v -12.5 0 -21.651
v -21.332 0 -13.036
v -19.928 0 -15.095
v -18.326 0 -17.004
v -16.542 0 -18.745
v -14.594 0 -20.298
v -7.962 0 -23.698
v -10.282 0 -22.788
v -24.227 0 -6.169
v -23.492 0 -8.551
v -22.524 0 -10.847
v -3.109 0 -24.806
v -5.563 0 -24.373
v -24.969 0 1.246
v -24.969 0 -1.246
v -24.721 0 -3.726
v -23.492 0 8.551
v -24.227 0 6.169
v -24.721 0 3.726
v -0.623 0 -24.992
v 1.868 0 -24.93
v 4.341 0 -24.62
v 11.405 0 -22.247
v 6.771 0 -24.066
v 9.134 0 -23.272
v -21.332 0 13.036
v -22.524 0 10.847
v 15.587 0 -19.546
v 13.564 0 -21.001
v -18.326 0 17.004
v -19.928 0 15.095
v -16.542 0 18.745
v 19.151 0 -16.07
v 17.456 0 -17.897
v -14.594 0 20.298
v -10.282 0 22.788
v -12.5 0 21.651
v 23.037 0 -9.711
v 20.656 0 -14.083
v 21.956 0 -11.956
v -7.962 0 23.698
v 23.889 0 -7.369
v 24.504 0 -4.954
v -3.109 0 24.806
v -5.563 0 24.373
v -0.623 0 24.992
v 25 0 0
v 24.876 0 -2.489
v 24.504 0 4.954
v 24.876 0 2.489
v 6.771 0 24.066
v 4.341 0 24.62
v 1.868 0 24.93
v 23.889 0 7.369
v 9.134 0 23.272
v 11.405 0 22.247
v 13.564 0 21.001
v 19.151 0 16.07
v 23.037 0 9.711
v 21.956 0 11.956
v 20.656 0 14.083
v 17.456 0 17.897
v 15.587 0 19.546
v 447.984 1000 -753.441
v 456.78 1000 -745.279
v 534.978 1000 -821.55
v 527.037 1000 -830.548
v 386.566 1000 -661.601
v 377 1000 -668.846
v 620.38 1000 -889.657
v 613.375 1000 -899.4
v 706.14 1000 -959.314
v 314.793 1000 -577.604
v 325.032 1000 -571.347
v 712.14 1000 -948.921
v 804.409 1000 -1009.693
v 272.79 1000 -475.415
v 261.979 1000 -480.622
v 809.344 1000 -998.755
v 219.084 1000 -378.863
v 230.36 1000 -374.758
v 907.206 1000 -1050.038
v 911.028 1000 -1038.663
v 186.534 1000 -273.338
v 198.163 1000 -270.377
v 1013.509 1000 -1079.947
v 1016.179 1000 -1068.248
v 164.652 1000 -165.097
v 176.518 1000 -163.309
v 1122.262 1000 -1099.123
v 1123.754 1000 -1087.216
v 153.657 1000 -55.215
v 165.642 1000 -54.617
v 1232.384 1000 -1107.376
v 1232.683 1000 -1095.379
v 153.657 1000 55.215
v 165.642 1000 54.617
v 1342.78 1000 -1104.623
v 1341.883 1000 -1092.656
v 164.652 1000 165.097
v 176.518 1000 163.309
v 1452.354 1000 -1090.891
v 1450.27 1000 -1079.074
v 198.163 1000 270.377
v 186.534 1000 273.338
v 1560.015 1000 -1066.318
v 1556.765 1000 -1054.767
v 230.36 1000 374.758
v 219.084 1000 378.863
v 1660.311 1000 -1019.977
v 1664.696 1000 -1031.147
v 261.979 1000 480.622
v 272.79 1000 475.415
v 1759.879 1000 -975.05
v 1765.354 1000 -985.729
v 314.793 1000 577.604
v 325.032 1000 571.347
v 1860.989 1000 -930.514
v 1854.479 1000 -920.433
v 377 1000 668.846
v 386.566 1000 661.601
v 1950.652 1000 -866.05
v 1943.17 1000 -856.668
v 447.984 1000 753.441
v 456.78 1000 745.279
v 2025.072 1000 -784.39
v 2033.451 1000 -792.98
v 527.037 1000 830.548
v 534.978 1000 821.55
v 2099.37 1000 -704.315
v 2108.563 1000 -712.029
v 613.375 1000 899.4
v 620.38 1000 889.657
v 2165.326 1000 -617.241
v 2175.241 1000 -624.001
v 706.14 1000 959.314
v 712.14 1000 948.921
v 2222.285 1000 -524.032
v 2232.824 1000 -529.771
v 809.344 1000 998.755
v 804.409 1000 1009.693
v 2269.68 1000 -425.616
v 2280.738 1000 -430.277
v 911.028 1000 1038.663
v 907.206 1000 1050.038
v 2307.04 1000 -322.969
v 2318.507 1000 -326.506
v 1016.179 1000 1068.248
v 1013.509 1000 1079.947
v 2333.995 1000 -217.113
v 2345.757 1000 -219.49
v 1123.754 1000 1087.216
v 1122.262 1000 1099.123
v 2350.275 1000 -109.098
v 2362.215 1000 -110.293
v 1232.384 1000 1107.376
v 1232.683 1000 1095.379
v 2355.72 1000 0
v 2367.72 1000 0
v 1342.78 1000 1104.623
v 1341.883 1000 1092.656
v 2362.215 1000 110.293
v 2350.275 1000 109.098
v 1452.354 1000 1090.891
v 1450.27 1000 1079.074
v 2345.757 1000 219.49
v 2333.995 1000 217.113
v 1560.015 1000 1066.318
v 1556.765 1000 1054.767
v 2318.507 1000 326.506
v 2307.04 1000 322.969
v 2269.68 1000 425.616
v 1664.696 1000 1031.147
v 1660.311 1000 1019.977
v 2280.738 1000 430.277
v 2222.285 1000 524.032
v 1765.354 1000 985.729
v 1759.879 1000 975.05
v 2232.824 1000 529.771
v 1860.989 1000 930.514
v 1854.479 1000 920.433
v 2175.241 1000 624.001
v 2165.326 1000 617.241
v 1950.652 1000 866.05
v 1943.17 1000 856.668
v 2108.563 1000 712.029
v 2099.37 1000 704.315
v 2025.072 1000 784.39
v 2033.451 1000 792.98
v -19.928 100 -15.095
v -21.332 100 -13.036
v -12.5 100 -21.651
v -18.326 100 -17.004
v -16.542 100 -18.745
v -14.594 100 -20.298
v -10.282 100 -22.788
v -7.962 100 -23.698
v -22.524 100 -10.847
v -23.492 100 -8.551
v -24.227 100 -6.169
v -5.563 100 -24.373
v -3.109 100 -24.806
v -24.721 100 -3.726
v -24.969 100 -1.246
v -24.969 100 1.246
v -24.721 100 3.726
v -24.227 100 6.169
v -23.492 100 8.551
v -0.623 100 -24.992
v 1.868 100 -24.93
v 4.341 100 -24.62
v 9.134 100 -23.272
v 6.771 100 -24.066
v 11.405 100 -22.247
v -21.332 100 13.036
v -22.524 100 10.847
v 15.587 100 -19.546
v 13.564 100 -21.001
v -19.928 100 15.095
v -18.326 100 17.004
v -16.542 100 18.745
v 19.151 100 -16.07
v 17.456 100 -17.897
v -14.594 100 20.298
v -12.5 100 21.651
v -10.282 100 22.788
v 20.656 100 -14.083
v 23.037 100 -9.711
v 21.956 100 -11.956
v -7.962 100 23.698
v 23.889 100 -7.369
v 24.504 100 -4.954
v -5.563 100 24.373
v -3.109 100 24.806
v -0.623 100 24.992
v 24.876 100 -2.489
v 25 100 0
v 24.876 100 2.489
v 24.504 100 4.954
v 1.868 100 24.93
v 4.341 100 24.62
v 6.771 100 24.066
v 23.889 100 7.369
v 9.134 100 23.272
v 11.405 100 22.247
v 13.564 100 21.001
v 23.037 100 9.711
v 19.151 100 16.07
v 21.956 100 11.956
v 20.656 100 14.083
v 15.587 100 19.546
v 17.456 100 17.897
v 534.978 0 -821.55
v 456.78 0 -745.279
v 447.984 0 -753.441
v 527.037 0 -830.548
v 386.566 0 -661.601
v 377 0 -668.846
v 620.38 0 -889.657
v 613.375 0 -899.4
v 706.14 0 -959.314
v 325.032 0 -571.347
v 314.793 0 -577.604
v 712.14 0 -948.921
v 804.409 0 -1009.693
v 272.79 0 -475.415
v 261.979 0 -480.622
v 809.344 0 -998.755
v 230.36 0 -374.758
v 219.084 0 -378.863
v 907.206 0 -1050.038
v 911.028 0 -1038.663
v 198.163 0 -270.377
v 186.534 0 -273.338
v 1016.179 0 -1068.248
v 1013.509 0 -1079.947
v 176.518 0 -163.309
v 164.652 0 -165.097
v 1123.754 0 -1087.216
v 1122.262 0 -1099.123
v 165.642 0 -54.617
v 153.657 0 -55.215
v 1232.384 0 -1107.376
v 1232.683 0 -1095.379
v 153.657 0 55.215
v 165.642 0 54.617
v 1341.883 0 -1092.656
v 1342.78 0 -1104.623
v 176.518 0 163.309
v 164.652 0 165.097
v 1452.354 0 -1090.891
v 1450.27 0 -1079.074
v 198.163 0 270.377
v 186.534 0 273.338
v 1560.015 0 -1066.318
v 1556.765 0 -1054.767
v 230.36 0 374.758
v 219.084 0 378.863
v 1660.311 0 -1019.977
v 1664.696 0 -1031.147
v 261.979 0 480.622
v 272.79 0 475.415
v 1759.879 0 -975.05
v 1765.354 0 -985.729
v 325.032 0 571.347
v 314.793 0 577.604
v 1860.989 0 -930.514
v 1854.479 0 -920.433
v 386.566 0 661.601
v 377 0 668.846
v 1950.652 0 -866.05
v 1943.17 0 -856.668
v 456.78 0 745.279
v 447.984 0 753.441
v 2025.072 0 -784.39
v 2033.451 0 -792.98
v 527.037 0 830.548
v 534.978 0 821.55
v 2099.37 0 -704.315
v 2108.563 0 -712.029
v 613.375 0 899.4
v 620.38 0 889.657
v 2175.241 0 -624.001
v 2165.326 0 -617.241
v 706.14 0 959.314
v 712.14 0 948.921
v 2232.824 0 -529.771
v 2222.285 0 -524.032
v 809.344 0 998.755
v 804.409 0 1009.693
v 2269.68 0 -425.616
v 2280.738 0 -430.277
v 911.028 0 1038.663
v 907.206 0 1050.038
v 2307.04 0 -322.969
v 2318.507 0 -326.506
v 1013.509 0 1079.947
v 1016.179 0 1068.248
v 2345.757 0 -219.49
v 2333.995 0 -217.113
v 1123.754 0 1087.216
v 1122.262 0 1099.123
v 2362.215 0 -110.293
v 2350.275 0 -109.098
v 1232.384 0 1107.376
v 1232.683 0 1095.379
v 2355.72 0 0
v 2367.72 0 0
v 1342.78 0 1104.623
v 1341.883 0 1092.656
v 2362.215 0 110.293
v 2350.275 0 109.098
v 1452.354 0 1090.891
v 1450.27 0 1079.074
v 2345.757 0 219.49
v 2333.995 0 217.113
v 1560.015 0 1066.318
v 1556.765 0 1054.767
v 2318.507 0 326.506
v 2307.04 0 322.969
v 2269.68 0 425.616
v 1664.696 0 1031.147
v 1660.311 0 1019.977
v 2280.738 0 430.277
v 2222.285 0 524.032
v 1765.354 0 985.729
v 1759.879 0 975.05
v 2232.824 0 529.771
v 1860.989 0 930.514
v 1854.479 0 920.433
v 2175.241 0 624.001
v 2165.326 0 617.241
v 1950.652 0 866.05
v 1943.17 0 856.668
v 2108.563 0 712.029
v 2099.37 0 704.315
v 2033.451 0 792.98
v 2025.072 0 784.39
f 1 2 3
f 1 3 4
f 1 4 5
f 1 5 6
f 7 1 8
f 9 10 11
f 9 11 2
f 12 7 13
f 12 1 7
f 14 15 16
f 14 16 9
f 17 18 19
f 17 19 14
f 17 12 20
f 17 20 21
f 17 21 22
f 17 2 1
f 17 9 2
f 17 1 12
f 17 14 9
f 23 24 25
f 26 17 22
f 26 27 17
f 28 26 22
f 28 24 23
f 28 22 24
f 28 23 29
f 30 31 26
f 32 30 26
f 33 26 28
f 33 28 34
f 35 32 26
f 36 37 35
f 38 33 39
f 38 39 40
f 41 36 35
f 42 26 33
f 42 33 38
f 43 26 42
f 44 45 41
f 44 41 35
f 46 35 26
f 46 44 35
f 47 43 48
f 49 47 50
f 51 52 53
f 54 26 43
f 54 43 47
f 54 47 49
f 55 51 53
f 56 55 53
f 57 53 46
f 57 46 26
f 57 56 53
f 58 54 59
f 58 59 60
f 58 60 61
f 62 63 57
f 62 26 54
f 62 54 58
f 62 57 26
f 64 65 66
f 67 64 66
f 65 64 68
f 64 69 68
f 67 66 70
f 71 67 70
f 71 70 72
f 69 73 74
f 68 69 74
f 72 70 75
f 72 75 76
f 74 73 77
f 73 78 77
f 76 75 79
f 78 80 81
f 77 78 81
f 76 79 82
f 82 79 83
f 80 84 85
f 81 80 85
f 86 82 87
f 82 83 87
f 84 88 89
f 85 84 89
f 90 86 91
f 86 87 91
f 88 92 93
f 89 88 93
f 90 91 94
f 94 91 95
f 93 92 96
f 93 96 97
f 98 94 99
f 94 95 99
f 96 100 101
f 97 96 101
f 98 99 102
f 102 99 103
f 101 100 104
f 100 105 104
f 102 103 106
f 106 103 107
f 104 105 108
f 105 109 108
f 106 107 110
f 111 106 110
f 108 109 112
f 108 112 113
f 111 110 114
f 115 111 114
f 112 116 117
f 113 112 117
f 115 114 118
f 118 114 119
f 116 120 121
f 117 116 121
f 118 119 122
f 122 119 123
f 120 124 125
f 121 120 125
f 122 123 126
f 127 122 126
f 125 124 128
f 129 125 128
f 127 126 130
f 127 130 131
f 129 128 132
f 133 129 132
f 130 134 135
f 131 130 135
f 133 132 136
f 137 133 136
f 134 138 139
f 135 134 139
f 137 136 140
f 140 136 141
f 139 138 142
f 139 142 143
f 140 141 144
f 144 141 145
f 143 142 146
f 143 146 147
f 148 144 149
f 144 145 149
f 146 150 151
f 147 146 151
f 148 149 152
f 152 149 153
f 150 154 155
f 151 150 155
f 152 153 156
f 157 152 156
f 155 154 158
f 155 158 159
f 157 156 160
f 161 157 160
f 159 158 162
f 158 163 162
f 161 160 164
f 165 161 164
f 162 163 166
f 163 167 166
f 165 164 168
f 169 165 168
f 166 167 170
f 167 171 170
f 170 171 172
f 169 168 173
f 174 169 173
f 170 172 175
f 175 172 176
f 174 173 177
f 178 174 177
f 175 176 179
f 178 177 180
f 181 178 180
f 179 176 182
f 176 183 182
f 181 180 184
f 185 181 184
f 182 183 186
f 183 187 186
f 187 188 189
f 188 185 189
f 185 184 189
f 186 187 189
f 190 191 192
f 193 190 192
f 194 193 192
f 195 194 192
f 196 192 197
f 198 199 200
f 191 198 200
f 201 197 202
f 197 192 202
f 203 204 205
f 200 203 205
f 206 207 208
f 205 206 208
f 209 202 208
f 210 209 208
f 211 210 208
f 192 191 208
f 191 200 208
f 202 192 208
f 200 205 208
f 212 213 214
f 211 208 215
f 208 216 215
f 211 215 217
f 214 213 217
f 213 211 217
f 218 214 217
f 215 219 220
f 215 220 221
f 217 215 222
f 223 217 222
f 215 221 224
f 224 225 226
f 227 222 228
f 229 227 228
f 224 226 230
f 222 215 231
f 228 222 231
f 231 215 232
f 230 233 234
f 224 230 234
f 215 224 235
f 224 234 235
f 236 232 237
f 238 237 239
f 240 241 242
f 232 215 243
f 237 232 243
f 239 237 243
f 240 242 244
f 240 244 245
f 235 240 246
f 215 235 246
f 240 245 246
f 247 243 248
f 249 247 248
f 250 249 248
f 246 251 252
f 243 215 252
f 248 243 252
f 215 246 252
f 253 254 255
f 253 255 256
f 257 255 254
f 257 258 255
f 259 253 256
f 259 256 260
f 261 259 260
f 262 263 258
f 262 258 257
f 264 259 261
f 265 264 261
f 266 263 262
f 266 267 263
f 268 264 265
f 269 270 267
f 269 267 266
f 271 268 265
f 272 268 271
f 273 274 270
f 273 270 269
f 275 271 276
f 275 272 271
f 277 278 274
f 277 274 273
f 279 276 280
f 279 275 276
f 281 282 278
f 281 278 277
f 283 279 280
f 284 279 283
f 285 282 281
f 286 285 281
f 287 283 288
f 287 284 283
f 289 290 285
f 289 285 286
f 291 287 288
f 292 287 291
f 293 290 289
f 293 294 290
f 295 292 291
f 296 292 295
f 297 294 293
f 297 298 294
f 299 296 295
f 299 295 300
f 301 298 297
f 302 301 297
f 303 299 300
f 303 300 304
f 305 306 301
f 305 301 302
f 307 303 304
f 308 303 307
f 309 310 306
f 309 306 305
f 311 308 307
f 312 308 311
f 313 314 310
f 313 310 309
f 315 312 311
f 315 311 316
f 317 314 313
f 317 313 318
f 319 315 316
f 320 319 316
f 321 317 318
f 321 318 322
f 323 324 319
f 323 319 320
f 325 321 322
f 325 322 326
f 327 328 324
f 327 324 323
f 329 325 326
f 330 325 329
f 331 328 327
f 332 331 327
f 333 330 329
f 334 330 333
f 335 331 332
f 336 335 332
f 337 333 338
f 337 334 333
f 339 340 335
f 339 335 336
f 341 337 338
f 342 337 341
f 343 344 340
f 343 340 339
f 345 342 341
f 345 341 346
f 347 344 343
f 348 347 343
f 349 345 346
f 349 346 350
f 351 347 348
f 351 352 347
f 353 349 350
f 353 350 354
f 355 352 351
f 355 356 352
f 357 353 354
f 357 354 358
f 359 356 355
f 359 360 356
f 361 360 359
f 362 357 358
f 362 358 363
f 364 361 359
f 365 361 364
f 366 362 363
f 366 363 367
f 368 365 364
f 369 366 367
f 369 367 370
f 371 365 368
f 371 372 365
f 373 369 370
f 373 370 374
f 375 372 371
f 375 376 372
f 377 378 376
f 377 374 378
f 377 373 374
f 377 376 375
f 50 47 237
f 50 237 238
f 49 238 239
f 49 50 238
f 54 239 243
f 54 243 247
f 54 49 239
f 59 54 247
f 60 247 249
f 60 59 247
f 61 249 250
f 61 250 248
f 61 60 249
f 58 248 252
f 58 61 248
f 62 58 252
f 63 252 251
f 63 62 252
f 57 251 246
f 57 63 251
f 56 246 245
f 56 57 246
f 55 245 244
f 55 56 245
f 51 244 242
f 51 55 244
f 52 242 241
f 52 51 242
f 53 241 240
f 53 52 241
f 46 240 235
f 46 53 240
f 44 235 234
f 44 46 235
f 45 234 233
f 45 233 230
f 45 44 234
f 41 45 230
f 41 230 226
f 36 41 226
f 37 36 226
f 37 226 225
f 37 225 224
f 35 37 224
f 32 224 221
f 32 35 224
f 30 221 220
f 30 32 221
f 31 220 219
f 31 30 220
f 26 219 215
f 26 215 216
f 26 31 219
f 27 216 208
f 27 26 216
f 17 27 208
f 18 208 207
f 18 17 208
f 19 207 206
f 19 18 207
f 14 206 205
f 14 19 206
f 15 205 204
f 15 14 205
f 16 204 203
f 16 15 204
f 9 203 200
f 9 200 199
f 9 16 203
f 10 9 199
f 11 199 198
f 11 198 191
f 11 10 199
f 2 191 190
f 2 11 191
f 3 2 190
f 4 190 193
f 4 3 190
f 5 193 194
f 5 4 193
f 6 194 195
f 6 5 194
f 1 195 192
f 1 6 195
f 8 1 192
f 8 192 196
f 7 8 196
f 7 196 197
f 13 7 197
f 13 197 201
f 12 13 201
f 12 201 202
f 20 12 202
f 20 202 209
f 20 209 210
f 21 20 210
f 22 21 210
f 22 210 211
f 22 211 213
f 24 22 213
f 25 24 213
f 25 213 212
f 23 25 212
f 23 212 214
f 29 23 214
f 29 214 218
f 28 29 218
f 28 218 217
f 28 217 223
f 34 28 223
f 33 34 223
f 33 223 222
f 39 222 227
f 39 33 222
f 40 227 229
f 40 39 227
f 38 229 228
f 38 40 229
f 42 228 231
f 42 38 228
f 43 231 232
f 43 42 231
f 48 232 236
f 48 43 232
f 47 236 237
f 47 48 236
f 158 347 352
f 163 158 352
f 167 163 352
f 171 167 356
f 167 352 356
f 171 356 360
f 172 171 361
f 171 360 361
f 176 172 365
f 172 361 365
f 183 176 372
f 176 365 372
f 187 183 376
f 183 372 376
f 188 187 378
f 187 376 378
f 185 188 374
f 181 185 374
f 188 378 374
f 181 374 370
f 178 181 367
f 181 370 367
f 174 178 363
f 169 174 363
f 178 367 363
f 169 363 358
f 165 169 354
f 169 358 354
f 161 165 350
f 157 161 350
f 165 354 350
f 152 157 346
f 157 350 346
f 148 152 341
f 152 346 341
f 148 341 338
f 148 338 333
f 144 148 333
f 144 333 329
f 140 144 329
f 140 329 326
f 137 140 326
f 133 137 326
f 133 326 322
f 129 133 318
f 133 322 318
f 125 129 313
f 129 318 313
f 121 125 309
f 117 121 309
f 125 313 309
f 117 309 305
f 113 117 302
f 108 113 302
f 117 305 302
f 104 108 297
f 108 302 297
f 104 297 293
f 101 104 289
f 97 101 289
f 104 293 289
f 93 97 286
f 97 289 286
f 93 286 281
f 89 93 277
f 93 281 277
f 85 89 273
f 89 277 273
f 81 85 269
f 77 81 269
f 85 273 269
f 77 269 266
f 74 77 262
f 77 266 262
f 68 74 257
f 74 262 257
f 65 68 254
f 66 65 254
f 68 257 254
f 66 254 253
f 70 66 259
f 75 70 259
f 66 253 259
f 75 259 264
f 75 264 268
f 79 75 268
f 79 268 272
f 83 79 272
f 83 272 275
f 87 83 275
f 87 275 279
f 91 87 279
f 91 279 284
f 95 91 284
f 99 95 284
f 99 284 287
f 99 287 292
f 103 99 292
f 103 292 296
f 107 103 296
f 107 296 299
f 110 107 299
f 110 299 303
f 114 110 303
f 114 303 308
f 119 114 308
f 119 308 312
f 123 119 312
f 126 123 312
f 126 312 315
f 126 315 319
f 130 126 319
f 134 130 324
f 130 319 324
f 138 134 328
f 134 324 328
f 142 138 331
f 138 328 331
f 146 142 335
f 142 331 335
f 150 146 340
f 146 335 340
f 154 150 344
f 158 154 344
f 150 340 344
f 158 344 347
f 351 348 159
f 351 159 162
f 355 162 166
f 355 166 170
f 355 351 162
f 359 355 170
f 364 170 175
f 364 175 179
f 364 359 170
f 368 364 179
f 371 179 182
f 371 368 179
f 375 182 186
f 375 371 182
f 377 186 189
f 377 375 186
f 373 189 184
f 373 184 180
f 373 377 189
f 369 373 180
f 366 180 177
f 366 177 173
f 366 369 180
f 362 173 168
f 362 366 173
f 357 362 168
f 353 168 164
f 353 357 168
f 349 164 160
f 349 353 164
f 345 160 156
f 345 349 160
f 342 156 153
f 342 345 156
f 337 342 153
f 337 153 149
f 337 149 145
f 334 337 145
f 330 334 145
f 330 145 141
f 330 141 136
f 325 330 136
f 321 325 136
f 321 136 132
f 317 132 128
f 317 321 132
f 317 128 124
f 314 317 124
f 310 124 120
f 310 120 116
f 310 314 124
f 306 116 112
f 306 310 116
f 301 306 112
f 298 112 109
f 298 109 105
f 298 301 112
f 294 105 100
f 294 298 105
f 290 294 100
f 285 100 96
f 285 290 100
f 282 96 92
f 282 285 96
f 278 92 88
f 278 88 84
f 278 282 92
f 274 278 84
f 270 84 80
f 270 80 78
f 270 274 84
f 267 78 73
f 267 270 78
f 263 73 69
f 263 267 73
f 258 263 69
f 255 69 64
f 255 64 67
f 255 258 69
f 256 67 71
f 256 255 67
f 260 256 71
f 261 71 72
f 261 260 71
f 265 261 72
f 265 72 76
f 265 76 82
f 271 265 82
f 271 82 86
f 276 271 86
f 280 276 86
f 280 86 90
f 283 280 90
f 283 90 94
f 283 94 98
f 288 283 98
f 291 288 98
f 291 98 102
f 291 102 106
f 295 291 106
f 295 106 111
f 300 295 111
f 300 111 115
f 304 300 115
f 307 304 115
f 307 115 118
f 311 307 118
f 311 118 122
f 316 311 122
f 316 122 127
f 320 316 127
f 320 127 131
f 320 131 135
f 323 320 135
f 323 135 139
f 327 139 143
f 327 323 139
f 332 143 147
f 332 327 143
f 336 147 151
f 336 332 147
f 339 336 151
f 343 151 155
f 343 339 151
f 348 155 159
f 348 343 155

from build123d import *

# Parameters (mm, degrees)
F0_R     = 25
F1_DEPTH = 100
F2_R     = 1107.72
F2_R_2   = 1095.72
F3_DEPTH = 1000


with BuildPart() as f1:
    # F0 (on Front) → F1 (new body)
    with BuildSketch(Plane.XZ):
        Circle(F0_R)
    extrude(amount=-F1_DEPTH)


with BuildPart() as f3:
    # F2 (on Front) → F3 (new body)
    with BuildSketch(Plane.XZ):
        with Locations((1260, 0)):
            Circle(F2_R)
        with Locations((1260, 0)):
            Circle(F2_R_2, mode=Mode.SUBTRACT)
    extrude(amount=-F3_DEPTH)


solid = Compound([f1.part, f3.part])
